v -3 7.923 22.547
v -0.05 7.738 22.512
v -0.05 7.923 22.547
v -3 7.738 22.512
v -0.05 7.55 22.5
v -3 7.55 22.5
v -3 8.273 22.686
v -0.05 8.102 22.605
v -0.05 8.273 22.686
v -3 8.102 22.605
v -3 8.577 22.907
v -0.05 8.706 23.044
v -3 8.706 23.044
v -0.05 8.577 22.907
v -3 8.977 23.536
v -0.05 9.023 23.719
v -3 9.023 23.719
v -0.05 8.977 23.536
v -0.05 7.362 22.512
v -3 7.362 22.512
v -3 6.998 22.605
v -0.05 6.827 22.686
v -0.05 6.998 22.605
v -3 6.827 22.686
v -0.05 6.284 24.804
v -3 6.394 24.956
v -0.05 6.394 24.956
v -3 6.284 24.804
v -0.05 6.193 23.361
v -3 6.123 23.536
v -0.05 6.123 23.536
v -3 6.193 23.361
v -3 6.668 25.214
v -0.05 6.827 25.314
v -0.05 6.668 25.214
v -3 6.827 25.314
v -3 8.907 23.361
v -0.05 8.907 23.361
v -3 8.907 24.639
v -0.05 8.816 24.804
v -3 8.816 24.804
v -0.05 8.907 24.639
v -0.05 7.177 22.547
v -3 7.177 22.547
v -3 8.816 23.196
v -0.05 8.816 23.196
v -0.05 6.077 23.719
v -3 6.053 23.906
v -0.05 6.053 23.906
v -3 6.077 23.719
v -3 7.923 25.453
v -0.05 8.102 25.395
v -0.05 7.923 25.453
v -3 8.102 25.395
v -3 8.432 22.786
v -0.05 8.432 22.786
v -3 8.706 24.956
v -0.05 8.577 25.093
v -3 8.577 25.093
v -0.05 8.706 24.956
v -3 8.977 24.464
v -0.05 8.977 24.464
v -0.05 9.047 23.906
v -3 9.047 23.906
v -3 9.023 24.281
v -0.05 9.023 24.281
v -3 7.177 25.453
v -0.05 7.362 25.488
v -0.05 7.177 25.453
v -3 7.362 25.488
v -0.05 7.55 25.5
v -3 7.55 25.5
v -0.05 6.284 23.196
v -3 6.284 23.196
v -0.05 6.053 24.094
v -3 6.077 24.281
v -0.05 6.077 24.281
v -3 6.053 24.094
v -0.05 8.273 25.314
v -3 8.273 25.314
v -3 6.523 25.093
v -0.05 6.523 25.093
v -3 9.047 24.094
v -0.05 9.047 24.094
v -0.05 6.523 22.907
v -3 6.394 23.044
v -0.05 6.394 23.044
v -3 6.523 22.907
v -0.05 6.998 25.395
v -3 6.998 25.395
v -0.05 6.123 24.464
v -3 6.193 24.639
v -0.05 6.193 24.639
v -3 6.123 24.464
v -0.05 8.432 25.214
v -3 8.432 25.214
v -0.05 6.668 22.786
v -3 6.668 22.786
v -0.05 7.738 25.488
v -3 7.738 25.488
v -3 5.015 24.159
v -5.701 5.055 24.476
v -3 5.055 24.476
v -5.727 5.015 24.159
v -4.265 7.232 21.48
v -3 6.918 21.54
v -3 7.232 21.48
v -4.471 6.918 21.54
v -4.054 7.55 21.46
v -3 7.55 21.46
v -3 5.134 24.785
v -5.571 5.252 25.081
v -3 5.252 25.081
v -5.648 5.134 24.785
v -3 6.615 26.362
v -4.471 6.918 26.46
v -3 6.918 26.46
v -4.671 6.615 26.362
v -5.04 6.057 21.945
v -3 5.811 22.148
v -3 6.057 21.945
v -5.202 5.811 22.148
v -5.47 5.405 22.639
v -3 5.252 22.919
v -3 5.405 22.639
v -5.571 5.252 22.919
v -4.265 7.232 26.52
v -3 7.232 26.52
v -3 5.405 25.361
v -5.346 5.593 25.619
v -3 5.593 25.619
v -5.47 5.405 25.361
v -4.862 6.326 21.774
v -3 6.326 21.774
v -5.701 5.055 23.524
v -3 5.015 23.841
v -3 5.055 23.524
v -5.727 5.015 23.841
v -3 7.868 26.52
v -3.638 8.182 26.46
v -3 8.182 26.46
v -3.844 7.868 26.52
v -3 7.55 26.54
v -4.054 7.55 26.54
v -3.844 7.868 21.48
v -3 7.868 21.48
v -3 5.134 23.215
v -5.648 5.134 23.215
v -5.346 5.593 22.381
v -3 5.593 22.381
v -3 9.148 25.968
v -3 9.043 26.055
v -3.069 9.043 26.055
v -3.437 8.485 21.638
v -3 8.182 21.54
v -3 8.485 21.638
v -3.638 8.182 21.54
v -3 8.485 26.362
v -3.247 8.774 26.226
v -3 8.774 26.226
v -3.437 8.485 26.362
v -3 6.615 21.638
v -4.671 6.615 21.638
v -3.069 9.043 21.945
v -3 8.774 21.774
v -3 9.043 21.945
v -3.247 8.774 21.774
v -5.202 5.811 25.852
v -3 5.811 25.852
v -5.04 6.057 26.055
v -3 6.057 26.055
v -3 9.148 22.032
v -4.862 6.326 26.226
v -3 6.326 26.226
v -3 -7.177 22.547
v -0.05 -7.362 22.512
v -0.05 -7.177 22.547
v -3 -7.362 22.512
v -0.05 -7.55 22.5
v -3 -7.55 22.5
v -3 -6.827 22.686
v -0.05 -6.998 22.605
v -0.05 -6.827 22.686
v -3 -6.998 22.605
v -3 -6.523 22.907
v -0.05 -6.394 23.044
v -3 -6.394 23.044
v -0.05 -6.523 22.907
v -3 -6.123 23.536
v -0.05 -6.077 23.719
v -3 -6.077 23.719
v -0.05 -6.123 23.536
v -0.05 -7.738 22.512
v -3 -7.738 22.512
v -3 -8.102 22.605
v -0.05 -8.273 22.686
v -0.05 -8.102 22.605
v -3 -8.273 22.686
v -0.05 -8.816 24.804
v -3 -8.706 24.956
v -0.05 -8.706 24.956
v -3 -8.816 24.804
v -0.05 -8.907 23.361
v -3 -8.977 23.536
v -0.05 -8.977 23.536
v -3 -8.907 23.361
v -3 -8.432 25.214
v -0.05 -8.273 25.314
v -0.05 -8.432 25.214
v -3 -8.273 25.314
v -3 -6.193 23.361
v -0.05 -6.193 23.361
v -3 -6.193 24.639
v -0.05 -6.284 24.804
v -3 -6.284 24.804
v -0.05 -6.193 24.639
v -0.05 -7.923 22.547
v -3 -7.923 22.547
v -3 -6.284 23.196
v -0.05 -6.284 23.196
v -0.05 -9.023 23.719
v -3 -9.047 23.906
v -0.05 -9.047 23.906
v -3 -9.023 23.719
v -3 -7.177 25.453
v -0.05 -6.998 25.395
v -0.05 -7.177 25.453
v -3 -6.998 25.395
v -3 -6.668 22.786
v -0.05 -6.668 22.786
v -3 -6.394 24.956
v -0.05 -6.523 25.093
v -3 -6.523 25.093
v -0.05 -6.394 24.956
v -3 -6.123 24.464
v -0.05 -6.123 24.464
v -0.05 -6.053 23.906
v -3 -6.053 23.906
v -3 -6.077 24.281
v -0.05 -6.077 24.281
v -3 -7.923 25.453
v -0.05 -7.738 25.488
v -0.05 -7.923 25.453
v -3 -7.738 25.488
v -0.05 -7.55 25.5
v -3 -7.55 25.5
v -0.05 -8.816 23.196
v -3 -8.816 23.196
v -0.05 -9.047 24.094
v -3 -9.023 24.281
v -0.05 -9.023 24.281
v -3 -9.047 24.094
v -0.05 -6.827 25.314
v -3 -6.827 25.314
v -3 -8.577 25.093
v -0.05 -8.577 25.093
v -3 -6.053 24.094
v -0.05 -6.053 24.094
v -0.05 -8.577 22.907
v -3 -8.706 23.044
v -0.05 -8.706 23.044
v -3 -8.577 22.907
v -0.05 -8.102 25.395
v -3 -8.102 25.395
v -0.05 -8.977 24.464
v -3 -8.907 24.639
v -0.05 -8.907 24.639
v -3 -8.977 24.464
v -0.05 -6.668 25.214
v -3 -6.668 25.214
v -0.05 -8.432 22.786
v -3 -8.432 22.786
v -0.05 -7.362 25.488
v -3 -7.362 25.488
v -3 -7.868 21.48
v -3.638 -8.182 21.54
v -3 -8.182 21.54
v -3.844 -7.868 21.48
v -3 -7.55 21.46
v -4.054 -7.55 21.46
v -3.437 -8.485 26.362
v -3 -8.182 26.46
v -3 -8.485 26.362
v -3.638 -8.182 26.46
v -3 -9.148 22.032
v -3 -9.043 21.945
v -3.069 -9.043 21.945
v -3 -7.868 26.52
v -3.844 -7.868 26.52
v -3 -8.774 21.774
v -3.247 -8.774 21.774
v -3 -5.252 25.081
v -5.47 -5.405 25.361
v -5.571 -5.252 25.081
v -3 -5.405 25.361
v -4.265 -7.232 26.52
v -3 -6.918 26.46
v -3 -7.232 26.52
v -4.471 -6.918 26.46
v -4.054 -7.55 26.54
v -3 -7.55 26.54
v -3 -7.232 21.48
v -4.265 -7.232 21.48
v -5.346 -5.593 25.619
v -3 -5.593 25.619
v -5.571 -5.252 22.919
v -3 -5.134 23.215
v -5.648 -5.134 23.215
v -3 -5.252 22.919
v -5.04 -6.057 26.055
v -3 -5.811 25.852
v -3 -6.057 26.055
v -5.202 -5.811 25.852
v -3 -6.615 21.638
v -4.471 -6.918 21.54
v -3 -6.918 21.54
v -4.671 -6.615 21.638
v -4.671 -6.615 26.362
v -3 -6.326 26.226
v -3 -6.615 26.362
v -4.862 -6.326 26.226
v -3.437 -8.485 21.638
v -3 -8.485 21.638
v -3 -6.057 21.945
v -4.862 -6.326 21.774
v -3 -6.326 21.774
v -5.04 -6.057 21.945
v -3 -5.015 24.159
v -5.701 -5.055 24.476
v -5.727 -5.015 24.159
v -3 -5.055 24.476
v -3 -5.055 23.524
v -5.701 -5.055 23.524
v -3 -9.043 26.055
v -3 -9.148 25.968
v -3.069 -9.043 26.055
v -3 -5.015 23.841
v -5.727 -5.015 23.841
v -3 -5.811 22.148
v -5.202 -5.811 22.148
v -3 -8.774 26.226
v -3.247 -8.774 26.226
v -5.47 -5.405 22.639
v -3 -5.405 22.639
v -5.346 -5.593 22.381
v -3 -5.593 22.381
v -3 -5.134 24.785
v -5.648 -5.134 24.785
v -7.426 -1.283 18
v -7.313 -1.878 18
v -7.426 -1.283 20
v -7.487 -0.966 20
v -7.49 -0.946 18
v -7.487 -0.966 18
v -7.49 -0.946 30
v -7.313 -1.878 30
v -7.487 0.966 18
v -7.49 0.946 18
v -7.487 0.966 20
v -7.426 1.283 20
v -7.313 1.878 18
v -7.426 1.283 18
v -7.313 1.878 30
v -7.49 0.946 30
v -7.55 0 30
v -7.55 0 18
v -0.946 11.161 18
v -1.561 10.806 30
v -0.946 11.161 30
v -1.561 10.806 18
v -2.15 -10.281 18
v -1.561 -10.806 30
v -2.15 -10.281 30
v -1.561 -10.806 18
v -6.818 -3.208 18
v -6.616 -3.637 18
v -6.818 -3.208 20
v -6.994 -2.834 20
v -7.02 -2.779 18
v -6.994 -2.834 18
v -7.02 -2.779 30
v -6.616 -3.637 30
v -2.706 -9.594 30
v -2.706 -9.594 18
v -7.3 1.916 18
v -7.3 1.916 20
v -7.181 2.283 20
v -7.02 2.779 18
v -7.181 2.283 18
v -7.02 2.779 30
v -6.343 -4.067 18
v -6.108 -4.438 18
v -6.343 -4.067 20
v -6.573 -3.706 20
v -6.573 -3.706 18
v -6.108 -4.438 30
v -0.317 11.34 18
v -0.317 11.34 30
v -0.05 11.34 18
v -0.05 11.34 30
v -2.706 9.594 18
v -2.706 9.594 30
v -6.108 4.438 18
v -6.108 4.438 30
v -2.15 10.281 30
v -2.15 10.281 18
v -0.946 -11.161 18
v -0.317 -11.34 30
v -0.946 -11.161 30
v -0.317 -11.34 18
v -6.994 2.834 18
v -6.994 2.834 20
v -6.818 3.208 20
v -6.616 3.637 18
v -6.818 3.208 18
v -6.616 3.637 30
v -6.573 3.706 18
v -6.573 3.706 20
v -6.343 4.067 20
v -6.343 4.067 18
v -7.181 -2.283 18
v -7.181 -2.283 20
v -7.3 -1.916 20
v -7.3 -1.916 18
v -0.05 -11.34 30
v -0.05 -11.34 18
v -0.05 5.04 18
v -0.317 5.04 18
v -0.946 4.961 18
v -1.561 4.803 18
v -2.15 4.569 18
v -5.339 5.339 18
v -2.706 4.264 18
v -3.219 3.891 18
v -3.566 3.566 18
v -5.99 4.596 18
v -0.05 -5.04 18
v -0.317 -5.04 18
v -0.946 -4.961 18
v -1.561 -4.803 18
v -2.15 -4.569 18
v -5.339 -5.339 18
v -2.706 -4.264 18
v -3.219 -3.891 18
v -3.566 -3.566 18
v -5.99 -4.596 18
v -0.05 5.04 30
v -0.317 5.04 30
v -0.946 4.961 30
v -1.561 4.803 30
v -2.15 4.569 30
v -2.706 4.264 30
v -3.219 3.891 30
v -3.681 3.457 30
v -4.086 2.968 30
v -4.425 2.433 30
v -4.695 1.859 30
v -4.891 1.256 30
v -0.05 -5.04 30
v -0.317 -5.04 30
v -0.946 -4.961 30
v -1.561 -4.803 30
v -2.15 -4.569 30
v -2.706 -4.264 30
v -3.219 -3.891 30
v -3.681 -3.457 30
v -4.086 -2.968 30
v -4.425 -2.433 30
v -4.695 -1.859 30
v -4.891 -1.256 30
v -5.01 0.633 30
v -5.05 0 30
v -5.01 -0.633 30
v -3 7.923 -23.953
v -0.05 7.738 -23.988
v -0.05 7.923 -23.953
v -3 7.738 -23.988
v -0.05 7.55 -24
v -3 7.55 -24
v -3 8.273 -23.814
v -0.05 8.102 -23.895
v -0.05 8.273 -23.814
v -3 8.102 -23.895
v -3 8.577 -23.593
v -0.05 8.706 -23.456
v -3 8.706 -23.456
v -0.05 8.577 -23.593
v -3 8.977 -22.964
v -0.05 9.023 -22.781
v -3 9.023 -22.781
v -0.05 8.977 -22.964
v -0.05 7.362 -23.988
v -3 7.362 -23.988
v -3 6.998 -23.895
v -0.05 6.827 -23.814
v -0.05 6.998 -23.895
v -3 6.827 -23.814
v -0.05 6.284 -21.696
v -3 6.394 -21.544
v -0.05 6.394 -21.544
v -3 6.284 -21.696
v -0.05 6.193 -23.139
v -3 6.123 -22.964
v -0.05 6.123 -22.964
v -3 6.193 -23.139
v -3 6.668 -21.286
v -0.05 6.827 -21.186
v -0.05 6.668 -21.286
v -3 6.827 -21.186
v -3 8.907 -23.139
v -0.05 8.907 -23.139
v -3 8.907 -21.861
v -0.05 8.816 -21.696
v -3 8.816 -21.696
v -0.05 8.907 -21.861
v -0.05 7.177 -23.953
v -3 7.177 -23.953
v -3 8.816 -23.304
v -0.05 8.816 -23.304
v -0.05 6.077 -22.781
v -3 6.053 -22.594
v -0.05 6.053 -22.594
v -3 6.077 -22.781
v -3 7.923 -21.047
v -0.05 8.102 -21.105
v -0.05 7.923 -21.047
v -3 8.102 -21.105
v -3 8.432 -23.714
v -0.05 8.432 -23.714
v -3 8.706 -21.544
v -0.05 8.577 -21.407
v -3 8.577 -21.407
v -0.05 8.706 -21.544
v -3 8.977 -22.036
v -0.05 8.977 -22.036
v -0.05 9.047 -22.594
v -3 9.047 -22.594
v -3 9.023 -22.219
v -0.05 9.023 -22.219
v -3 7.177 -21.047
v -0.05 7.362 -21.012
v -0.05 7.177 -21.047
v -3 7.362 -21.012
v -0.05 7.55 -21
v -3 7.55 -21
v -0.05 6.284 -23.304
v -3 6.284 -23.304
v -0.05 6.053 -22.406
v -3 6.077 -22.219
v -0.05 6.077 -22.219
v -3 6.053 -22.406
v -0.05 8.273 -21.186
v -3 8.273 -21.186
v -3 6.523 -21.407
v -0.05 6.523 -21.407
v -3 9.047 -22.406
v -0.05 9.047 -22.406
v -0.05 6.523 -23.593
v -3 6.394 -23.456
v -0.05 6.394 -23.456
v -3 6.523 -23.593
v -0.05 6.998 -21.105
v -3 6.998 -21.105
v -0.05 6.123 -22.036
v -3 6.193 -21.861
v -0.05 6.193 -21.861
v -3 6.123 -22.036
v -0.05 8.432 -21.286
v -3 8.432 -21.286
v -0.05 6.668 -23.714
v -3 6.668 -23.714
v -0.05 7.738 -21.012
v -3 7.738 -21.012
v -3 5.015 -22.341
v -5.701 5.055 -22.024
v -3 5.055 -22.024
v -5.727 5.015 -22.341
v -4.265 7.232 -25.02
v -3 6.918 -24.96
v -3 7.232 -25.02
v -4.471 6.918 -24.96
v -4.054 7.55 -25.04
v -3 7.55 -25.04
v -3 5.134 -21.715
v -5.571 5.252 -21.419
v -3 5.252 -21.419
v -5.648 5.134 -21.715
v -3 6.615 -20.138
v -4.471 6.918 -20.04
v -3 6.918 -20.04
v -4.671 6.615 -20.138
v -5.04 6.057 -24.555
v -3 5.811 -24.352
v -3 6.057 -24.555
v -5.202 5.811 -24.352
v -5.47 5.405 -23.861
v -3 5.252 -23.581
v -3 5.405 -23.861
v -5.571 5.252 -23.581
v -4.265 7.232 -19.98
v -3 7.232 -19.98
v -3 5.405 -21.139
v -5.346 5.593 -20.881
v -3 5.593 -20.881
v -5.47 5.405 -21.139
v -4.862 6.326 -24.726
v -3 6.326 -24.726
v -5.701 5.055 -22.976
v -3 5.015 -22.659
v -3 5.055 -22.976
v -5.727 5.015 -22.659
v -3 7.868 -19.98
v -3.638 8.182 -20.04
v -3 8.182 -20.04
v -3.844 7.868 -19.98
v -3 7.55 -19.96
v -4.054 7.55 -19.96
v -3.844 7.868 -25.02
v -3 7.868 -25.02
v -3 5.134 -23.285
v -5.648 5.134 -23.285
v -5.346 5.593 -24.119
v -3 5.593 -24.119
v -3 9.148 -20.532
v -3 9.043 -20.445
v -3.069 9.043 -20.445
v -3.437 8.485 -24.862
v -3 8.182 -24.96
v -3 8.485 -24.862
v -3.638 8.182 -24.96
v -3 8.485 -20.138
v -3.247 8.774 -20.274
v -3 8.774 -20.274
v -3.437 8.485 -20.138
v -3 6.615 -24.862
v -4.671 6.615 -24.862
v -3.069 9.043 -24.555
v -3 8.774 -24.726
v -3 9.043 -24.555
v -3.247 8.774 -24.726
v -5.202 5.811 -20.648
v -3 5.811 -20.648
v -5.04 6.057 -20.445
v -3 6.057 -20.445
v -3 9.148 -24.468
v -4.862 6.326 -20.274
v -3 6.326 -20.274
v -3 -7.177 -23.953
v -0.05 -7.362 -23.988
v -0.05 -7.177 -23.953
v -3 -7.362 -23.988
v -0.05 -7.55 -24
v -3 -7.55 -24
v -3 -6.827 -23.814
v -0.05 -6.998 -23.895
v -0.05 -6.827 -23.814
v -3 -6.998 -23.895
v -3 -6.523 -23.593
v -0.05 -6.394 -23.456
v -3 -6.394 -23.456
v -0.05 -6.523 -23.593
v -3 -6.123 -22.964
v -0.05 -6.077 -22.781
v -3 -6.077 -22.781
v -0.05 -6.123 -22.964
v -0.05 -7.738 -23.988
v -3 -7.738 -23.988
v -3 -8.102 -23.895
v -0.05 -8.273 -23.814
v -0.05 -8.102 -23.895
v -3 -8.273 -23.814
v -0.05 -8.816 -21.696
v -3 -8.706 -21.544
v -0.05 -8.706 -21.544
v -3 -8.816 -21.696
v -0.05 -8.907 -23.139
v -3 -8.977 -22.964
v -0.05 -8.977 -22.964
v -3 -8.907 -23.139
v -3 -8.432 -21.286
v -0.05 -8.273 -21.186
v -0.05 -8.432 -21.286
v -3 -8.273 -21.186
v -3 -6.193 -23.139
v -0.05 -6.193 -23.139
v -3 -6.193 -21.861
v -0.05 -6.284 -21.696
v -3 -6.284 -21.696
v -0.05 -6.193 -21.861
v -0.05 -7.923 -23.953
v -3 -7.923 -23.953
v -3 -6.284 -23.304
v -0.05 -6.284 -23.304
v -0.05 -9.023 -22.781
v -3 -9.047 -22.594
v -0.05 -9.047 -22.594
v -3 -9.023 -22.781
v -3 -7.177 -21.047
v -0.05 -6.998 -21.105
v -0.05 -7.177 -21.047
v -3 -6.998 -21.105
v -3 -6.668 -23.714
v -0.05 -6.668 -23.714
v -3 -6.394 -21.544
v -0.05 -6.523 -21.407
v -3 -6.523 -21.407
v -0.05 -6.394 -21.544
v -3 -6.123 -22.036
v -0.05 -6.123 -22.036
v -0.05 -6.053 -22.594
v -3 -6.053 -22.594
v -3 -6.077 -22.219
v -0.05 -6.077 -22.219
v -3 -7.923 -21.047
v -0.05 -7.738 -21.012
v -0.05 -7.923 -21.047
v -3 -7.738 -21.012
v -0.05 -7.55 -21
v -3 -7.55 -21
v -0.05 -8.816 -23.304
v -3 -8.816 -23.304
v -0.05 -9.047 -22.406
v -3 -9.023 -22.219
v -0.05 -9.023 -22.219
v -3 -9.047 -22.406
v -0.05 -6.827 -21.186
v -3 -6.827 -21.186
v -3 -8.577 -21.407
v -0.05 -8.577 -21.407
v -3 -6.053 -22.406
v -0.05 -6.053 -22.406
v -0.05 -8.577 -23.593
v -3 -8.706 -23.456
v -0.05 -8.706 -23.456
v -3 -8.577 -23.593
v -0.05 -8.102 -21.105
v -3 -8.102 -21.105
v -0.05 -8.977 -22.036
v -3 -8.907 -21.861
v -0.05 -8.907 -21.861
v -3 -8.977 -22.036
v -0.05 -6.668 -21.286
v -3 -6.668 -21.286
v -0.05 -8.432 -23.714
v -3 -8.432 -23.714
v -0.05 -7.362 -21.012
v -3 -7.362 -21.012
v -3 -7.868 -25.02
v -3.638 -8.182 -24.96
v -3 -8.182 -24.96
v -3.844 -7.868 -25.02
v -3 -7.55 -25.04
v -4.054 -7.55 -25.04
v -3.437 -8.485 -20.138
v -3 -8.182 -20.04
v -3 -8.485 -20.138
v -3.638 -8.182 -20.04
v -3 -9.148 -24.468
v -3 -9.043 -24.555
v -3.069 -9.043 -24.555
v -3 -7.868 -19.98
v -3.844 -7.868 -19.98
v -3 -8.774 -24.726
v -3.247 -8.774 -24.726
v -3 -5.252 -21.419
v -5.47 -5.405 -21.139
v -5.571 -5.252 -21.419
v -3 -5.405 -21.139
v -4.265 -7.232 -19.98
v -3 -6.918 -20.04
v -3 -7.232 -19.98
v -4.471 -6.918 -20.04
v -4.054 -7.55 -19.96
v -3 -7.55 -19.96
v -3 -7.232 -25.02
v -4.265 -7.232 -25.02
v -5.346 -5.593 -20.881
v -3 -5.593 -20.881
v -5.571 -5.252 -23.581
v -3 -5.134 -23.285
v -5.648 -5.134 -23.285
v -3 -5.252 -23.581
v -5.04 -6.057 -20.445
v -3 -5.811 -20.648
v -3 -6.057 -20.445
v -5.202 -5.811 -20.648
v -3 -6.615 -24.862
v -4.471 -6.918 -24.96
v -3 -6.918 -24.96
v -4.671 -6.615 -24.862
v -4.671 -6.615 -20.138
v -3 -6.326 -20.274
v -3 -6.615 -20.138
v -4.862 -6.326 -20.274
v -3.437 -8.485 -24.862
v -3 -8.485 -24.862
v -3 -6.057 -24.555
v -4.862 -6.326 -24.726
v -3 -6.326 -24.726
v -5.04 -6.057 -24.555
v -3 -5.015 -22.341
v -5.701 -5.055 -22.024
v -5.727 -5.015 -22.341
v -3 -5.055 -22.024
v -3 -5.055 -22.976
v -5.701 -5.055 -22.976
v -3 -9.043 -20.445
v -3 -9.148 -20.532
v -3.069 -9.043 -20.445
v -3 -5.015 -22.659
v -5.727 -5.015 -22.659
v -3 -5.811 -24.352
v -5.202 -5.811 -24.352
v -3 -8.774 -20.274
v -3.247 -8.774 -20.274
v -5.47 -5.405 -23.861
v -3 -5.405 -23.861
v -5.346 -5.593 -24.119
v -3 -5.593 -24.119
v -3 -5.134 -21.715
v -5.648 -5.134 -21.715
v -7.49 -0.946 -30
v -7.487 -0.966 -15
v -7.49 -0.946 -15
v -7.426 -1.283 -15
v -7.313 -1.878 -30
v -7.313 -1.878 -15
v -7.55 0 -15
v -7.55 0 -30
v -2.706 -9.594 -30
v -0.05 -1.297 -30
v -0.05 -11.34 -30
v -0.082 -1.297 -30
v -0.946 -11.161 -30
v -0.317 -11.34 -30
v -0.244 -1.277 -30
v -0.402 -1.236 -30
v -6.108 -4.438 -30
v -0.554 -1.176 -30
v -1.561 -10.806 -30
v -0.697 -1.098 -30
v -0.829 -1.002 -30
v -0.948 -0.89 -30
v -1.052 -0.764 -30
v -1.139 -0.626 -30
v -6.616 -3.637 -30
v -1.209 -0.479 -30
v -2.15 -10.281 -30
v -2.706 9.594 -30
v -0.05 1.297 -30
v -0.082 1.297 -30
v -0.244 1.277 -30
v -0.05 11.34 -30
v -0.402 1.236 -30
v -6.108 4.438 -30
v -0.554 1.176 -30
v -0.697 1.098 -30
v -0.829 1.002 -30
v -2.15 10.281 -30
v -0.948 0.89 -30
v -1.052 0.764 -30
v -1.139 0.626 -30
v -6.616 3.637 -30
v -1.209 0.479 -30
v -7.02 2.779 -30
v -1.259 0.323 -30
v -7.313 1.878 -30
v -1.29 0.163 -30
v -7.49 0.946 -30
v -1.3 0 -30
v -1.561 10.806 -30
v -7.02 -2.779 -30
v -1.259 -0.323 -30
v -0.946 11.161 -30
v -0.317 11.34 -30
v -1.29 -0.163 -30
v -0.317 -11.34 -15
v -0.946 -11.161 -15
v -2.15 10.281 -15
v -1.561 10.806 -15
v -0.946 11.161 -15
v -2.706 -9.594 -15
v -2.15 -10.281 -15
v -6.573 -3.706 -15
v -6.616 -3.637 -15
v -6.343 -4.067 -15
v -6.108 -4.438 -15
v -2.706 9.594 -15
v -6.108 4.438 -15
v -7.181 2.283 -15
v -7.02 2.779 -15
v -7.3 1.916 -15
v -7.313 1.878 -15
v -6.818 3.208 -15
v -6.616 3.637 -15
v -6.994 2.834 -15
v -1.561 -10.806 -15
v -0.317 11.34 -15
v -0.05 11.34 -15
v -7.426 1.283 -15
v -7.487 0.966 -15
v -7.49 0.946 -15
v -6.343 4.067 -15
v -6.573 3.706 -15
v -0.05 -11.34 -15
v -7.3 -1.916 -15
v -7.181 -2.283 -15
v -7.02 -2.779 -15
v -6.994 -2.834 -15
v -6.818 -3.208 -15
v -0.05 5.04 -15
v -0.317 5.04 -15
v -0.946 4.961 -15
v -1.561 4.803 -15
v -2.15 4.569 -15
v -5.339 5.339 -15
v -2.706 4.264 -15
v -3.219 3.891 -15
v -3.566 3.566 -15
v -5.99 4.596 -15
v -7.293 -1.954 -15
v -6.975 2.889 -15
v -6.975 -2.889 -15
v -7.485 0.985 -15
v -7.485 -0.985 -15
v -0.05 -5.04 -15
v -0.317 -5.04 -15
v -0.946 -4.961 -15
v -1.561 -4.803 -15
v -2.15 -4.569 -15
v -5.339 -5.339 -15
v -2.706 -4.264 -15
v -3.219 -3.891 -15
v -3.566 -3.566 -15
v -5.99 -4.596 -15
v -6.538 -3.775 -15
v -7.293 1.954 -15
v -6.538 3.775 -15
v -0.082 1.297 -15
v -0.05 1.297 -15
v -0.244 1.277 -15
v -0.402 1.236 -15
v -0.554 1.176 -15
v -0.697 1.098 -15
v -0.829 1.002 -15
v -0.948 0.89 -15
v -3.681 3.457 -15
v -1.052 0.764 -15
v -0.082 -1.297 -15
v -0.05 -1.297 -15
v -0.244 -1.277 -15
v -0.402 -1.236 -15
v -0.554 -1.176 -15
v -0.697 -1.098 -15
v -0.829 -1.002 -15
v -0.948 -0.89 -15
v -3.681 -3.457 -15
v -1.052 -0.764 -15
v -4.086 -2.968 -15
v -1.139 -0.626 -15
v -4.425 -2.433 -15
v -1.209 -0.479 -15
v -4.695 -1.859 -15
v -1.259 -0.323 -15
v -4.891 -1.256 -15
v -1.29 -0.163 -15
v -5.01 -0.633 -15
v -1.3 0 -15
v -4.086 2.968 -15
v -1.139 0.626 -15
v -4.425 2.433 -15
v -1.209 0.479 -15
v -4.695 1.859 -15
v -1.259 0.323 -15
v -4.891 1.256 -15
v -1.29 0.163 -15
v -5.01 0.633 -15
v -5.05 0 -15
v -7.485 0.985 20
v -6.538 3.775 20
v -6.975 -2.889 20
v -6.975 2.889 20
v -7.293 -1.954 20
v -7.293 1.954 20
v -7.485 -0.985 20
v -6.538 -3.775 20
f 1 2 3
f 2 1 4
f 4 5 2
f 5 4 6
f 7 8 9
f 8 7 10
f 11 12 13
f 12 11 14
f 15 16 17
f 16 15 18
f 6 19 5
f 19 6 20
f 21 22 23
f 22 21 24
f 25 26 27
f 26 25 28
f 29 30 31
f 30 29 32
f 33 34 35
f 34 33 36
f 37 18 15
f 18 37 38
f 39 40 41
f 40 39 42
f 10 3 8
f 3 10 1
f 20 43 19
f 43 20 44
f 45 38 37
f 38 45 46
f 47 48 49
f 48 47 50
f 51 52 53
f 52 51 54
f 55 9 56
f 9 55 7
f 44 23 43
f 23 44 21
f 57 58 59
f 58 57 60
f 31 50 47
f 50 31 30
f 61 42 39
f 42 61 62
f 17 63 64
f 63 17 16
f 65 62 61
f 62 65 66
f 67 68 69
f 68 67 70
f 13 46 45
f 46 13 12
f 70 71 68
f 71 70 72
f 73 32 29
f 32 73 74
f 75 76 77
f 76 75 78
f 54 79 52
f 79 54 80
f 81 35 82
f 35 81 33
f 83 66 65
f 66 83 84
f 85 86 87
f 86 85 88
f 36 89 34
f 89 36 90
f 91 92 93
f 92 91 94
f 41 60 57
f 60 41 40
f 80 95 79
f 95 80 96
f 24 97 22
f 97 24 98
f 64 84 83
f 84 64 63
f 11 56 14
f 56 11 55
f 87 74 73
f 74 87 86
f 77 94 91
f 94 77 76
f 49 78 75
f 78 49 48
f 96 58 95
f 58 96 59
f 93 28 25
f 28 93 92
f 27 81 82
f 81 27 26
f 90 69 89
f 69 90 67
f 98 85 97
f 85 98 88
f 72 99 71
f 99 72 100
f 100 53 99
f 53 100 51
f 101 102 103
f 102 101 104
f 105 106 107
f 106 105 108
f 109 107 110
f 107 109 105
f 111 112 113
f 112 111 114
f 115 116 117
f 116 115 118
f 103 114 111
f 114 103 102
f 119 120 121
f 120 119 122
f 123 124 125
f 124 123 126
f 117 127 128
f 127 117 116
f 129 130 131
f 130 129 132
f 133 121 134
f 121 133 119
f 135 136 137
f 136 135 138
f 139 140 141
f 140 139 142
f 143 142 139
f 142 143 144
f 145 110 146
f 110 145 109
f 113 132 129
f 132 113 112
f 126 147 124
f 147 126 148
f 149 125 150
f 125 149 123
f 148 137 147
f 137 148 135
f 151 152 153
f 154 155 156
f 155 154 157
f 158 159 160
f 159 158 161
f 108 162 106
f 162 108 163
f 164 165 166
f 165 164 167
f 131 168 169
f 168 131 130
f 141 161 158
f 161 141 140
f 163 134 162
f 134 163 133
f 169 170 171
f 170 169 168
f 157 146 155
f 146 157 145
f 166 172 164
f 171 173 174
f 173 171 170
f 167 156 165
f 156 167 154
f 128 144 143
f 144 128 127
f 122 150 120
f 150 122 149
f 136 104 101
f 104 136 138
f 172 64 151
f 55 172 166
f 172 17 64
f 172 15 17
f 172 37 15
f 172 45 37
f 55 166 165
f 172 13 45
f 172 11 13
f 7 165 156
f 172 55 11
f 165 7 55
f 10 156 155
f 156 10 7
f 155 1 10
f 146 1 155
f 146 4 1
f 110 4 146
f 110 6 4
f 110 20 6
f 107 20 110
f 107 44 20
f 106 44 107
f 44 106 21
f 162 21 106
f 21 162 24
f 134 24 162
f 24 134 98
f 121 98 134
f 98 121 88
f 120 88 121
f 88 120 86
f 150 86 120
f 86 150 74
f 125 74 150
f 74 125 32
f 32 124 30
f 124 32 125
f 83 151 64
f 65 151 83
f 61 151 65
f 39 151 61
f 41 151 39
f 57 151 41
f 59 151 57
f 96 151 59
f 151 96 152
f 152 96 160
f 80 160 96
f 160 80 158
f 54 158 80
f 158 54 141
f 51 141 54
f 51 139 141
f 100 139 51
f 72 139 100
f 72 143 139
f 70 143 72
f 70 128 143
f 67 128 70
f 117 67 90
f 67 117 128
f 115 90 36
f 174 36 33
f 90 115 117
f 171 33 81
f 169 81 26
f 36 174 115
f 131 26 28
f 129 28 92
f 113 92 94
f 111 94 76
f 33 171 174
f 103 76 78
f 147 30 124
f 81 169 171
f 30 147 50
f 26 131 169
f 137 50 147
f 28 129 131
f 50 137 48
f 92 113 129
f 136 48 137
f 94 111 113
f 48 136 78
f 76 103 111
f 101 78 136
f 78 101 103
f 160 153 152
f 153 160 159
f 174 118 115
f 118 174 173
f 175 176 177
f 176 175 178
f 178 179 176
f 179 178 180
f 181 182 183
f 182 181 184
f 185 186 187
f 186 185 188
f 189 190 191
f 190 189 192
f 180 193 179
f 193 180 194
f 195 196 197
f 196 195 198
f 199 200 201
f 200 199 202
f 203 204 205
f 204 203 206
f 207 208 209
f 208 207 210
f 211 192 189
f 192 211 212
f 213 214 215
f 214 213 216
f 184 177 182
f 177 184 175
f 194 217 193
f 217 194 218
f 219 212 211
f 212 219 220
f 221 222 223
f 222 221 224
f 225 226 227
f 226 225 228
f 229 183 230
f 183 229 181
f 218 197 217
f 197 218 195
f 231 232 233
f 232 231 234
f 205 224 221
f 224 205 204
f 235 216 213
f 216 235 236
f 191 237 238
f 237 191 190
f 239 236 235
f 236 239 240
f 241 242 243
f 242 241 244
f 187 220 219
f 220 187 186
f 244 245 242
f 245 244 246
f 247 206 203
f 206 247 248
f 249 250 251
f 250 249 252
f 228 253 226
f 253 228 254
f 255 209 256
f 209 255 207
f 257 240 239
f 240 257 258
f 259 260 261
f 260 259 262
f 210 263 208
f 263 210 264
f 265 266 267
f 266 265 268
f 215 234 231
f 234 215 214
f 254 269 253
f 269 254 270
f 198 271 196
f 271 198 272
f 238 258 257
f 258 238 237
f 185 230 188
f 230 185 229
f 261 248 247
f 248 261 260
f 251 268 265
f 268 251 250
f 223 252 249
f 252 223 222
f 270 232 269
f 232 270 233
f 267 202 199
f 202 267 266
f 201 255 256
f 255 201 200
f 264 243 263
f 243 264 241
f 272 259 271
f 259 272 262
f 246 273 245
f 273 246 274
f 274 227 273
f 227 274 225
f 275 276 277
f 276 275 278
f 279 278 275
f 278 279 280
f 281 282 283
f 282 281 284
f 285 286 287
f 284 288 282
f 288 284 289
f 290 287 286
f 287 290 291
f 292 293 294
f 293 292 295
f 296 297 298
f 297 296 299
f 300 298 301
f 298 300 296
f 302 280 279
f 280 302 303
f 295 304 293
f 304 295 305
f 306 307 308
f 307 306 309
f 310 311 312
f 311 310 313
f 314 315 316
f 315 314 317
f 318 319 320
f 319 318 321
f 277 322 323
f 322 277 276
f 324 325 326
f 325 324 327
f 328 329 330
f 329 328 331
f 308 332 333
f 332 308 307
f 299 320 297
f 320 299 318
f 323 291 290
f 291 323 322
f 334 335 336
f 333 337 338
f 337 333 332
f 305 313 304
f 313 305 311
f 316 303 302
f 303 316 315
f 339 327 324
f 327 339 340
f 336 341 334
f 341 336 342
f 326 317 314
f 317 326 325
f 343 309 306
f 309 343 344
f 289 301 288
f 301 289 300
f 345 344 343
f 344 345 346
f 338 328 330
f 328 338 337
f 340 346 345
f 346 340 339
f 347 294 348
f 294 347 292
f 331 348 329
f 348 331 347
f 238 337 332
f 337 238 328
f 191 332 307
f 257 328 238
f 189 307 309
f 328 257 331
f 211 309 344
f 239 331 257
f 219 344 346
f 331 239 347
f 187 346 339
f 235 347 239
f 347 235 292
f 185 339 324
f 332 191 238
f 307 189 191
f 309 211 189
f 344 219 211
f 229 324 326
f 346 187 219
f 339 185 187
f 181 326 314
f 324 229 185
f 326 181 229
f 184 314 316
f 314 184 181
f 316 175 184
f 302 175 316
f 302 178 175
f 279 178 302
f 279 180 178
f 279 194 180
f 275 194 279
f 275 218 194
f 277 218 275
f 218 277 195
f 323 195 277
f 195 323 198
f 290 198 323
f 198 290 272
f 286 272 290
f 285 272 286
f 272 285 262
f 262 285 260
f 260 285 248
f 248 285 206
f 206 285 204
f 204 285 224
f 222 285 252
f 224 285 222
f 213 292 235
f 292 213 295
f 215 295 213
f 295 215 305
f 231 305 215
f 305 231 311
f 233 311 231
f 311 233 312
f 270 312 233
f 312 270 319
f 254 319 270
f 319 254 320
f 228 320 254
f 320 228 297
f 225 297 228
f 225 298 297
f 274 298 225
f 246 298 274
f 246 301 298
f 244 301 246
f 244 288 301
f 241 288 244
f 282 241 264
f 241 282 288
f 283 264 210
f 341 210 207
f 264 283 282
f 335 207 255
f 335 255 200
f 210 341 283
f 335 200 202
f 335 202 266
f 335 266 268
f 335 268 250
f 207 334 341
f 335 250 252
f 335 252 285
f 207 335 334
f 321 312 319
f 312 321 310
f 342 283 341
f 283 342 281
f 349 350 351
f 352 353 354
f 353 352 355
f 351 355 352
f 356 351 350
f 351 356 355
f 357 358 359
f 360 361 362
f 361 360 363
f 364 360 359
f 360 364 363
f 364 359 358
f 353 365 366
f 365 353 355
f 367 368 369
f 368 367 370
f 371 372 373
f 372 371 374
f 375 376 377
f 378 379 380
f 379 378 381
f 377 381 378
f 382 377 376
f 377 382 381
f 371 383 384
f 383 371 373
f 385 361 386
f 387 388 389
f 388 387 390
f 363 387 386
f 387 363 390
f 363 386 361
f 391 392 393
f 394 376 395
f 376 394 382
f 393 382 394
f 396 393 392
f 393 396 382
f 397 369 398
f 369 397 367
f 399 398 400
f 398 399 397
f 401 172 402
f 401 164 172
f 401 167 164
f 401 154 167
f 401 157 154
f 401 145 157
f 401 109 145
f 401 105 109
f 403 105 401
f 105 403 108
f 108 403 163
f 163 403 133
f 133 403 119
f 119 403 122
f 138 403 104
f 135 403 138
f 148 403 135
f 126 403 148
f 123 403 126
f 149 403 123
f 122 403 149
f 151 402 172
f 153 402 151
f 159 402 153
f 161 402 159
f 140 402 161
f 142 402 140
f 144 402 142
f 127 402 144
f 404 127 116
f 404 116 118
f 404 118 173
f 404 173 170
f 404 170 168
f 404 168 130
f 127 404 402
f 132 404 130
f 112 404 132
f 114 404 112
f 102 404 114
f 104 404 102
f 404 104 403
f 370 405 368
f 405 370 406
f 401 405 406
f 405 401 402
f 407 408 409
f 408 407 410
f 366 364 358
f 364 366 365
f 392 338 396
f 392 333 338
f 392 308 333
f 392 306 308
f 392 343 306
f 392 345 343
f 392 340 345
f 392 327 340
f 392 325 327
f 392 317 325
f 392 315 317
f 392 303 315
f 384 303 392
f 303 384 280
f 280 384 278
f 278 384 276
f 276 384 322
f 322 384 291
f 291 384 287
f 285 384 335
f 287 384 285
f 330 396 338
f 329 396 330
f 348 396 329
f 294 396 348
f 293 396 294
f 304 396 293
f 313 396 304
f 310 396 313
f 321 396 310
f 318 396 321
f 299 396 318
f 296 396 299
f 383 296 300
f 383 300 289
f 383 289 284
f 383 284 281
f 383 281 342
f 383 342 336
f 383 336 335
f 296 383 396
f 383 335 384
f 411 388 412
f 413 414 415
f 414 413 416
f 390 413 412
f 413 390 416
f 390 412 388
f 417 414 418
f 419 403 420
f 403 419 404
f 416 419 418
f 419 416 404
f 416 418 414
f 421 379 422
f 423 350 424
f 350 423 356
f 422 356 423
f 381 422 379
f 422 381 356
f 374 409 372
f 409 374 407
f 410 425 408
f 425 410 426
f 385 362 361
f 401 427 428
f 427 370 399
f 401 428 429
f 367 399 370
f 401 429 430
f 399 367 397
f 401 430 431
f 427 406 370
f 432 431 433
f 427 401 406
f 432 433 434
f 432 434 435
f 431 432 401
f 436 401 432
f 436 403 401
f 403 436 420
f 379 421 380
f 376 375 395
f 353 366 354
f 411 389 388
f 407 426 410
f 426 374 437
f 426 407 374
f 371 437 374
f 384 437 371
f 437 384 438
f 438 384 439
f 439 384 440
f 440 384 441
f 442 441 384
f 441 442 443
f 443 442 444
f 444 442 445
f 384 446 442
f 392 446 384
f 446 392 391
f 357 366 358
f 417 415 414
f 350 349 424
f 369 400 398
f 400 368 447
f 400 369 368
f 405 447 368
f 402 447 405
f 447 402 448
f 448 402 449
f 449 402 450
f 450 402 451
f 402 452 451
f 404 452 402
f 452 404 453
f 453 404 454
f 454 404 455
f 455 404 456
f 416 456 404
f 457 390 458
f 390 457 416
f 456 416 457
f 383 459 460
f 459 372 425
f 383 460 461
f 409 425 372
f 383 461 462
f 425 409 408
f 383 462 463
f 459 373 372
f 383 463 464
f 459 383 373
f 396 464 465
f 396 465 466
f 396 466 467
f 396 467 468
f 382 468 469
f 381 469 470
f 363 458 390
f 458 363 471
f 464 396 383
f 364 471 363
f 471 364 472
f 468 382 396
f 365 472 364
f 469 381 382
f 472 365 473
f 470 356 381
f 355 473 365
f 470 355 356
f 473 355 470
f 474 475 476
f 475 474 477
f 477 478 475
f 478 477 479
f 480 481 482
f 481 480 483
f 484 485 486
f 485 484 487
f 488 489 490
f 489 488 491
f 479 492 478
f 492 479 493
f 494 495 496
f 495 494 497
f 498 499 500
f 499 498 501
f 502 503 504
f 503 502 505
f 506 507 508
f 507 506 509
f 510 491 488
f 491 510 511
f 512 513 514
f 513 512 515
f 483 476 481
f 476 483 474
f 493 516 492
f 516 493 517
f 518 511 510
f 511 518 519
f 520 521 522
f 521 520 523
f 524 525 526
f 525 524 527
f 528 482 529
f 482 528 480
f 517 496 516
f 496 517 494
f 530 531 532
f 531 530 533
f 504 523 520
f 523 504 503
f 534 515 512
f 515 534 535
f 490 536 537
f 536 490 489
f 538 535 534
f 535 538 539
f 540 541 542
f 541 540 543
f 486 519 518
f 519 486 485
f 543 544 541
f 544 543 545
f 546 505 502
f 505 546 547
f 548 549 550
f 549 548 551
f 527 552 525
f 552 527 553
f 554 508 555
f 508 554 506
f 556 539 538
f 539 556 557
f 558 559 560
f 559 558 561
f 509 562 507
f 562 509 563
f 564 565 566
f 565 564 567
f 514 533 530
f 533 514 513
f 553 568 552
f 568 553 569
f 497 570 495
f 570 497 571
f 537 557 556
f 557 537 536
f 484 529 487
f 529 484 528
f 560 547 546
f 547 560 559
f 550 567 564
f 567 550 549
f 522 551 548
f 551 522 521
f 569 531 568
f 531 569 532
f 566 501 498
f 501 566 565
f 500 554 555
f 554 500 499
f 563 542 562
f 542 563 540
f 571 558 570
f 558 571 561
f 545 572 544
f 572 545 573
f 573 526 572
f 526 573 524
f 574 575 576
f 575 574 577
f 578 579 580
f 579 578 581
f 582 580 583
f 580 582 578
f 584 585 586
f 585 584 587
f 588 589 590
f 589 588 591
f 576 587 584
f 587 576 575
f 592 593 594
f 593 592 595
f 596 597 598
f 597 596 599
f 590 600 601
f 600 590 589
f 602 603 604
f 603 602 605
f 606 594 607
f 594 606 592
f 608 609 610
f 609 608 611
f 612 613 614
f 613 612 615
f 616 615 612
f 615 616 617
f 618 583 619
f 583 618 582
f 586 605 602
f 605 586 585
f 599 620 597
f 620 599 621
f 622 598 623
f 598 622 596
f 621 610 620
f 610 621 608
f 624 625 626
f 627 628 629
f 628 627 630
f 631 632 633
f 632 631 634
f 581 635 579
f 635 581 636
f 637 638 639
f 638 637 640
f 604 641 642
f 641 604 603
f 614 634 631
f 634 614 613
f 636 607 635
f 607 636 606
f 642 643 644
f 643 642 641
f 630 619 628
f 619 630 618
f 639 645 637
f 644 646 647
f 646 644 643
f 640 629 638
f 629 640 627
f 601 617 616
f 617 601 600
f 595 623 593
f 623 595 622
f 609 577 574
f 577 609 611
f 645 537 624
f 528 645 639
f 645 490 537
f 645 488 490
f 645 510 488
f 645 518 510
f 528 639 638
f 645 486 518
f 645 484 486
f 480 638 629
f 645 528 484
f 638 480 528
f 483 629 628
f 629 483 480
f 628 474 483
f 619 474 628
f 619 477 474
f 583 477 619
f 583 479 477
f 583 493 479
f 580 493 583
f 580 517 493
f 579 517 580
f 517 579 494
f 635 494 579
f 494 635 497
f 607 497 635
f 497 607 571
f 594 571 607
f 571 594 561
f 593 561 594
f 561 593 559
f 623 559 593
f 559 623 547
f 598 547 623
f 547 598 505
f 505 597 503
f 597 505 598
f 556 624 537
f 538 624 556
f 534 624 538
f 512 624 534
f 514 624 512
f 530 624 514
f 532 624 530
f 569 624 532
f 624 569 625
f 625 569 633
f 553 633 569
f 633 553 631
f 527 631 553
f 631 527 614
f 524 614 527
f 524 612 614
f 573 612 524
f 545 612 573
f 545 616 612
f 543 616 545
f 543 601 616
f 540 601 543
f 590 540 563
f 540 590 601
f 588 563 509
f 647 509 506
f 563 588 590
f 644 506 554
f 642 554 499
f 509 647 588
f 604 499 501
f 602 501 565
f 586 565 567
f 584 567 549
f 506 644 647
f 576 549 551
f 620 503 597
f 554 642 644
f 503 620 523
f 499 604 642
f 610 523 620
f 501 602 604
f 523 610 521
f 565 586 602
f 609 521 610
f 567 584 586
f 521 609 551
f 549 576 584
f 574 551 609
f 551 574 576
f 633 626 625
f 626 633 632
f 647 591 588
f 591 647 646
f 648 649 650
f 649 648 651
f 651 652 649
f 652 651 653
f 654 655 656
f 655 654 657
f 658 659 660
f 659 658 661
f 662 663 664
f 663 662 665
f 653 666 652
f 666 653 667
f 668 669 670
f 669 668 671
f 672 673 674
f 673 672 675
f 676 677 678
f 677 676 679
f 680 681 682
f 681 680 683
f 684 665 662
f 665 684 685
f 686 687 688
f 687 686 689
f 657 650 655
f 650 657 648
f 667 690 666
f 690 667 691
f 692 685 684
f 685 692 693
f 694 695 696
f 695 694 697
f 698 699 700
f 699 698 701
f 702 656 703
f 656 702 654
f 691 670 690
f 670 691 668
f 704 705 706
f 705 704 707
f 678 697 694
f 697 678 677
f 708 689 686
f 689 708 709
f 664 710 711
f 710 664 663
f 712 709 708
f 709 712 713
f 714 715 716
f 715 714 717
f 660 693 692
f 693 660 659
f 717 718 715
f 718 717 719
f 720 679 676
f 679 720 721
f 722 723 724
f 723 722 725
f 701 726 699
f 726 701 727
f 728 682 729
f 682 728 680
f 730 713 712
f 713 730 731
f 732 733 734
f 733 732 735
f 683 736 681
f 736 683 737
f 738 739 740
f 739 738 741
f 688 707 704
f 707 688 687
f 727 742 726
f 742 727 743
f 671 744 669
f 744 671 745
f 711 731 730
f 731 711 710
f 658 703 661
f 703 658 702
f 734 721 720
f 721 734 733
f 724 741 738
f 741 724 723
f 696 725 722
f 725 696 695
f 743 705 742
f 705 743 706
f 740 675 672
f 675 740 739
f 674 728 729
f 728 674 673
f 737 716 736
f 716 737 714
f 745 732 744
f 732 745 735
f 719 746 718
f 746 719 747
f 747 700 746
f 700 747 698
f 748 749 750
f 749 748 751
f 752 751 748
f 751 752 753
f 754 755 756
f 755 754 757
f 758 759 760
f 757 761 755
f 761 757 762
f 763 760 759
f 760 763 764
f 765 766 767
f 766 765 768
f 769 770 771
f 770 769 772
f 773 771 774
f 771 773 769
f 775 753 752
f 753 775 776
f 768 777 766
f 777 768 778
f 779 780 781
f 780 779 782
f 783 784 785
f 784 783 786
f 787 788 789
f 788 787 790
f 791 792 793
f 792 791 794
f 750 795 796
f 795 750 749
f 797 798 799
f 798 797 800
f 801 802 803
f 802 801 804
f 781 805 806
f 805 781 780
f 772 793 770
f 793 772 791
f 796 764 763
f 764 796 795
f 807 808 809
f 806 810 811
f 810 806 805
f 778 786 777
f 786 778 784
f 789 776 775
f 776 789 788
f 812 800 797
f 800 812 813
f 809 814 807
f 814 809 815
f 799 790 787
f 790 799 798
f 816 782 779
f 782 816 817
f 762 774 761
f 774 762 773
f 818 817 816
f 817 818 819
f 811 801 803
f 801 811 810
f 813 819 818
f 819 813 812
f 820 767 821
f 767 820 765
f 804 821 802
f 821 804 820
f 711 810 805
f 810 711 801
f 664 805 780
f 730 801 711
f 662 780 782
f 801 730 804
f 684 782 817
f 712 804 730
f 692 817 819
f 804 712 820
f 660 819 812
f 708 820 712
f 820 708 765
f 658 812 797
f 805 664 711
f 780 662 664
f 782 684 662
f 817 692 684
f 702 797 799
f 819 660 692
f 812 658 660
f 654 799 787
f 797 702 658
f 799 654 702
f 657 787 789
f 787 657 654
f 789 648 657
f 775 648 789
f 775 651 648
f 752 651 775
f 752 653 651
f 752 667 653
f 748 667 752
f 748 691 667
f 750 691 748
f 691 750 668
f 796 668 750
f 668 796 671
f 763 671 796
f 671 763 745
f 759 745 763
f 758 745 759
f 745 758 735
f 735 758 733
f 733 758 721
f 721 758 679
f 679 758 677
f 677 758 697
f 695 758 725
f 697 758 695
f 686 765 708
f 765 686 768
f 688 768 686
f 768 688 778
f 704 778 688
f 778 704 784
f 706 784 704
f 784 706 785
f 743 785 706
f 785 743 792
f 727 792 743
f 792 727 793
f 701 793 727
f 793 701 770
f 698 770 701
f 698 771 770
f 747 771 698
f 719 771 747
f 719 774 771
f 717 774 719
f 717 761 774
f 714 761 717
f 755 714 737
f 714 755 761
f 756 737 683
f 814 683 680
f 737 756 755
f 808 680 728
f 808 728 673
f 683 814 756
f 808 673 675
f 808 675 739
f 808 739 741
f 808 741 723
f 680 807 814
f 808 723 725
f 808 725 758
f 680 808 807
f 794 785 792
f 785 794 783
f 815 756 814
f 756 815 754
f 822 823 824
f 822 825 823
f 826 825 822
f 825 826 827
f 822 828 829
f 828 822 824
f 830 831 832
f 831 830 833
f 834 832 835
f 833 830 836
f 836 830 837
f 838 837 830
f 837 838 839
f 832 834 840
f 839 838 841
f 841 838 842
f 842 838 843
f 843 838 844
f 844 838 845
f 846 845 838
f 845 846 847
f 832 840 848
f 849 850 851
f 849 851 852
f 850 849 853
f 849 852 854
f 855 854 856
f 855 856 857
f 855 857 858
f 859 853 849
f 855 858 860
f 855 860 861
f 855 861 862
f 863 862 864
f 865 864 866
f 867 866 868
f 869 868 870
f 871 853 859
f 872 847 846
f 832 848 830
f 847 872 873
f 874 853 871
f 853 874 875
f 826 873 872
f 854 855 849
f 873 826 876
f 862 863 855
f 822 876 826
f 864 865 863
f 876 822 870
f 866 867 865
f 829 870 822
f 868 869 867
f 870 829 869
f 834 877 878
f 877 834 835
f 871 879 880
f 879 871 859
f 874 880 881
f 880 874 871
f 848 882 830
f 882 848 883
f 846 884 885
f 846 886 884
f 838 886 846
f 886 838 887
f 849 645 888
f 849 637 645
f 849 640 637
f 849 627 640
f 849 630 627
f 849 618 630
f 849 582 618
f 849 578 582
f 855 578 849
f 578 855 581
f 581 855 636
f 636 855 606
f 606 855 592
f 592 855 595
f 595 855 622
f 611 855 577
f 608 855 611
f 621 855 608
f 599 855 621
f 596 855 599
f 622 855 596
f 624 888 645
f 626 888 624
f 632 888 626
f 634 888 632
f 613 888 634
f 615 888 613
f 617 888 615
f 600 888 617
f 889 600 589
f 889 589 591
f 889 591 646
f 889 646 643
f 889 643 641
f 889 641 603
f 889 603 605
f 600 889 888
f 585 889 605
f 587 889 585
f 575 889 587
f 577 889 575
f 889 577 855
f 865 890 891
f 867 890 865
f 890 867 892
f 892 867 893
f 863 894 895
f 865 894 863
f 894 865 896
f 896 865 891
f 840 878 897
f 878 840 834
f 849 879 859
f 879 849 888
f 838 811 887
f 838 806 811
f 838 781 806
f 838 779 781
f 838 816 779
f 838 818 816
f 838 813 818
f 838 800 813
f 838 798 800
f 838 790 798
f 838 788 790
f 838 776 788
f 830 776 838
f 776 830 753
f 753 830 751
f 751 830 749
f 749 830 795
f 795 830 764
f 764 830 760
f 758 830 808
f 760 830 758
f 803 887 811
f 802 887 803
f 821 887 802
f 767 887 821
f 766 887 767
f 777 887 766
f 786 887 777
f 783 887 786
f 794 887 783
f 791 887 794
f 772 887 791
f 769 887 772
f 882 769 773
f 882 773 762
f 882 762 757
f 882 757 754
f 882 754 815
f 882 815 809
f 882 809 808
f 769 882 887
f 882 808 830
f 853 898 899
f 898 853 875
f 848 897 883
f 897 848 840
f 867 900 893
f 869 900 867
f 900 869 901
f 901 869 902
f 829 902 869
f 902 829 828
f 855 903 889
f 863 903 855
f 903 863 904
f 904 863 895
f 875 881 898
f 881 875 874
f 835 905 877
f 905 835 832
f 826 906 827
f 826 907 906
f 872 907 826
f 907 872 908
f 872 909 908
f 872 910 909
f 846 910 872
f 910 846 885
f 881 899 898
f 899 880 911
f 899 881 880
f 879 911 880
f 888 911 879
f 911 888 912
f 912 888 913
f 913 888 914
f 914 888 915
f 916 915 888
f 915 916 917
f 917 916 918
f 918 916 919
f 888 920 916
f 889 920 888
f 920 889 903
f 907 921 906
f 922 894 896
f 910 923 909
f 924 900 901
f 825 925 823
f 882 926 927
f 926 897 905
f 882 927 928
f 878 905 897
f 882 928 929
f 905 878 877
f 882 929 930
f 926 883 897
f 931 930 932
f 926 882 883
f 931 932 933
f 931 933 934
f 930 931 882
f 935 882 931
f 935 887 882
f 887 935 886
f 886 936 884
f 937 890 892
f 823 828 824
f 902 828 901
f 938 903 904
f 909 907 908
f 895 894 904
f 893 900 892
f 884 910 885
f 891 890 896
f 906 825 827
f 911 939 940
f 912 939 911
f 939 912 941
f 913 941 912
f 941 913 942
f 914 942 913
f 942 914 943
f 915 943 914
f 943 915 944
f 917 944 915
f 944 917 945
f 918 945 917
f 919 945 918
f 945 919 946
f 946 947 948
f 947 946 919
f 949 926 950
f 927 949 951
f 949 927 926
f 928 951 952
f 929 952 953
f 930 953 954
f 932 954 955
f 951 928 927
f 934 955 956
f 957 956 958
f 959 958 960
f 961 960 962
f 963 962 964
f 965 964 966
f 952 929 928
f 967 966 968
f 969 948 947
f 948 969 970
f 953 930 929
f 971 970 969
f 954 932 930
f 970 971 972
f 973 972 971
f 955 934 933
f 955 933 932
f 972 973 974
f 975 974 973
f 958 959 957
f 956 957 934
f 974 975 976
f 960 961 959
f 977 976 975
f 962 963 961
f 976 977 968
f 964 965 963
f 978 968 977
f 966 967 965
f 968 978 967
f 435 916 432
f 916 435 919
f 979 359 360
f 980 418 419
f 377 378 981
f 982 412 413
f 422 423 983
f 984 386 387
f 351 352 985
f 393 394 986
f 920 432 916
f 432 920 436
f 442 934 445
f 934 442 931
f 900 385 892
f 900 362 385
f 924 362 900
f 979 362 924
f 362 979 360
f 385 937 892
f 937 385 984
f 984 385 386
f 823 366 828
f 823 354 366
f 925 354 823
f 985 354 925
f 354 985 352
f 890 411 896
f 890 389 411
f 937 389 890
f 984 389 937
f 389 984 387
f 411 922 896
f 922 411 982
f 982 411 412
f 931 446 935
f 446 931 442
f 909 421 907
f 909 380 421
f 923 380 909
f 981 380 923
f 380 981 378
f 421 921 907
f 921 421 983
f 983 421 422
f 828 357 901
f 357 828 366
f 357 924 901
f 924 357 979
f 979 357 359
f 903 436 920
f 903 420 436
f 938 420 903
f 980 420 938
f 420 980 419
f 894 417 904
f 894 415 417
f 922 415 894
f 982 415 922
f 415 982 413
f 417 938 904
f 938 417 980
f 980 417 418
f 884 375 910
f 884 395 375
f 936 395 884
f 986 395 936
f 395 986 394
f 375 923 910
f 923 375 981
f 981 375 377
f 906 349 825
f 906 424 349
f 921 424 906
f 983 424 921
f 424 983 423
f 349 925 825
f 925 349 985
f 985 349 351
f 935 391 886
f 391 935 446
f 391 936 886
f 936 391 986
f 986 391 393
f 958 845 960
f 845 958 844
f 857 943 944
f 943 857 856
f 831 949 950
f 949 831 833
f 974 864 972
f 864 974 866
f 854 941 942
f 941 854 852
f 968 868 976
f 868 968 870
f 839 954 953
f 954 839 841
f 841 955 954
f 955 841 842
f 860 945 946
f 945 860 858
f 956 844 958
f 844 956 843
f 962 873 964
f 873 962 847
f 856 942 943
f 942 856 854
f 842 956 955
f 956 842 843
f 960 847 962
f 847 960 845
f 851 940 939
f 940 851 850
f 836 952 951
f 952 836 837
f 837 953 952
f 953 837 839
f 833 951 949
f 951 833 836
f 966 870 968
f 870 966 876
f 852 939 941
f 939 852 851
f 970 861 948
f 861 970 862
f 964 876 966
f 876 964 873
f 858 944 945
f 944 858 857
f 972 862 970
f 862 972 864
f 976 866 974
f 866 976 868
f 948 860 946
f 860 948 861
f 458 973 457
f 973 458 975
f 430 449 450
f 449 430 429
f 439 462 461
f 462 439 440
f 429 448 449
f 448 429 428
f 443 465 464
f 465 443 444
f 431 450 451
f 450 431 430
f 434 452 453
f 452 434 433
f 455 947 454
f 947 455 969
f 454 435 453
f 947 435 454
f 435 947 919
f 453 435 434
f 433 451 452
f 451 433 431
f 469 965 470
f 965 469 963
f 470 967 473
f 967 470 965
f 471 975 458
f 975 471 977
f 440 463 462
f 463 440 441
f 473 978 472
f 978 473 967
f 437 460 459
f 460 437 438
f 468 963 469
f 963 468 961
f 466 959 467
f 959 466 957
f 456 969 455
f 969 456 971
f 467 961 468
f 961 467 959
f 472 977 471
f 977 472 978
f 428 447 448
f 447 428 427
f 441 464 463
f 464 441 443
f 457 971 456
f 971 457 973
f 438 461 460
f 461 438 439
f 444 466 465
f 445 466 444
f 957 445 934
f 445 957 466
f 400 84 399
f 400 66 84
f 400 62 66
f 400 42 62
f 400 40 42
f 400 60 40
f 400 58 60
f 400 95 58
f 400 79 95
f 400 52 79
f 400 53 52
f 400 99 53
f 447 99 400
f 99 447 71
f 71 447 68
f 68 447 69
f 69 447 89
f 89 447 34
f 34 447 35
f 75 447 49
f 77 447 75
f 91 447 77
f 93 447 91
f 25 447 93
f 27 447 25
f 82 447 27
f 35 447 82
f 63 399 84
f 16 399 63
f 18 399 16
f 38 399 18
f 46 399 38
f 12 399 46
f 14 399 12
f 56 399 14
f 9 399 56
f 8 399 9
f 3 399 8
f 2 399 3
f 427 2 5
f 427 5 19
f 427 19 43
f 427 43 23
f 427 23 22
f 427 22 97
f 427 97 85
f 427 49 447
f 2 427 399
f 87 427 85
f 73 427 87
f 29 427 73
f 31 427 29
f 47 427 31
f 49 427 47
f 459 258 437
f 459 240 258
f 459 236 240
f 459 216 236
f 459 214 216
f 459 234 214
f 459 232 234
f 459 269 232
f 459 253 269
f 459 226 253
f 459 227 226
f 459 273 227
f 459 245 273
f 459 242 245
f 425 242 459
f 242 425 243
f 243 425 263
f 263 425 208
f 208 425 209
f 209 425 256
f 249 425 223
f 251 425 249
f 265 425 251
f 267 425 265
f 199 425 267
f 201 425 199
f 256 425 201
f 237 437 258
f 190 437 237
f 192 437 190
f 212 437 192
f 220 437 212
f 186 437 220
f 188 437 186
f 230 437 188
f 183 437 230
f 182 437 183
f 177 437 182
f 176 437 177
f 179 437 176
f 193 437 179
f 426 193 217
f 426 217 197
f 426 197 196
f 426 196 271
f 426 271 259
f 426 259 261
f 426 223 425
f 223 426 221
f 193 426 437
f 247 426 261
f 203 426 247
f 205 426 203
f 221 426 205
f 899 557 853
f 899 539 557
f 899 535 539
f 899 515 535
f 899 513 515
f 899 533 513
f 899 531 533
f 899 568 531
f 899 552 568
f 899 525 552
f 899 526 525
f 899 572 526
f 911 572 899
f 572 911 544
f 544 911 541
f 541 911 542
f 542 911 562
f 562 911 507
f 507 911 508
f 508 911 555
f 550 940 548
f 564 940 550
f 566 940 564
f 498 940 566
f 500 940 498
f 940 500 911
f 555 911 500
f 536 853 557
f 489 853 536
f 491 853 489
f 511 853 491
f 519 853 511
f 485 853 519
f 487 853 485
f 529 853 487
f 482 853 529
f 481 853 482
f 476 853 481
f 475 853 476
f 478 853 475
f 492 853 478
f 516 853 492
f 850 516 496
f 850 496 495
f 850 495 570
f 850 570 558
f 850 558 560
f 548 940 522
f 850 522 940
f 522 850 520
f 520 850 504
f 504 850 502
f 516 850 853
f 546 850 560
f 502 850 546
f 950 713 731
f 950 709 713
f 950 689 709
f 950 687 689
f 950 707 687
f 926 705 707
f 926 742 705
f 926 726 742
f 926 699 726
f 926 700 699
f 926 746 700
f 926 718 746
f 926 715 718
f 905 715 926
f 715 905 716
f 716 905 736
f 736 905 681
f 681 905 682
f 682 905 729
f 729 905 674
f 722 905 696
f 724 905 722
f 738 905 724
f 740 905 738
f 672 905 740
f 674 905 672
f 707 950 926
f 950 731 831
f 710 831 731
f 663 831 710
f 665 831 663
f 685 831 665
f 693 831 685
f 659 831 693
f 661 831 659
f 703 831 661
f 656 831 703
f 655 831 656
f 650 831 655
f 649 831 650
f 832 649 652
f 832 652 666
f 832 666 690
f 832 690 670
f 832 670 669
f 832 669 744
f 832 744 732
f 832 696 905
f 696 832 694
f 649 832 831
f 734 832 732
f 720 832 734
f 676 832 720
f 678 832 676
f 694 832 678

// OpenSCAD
// clamped "cradle" for restraining stepper wires in our disected
// newport ppd225 linear actuator

$fn=50;
inch = 25.4;

// params
length = 60;
d_stepper = 10.1;
thickness = 2.5;
d_wire = 1.3;

sp = [0, d_stepper/2+thickness, length/2-5];

module screwhole(){
    union(){
        cylinder(20, r=1.5, center=true);  // fits 4-40
        translate([0,0, 3])
        cylinder(20, r=0.2*inch/2);
        translate([0,0,-3]) rotate([180,0,0])
        cylinder(20, r=0.2*inch/2);
    }
}

module clamp_cylinder(height, scale){
    difference(){
        linear_extrude(height=height)
        hull(){
            circle(r=d_stepper/2 + thickness);
            scale([1,scale]) circle(r=d_stepper/2);
        }
        for (pm=[1,-1]){
            translate([0, (d_stepper/2+thickness)*pm, height/2])
            rotate([0,90,0])
            screwhole();
        }
    }
}

module structure_cylinder(){
    translate([0,0,-15])
    rotate([0, 0, 135])
    rotate_extrude(angle=90)
    square([d_stepper/2 + thickness, 35]);
    //cylinder(h=length, r=d_stepper/2 + thickness, center=true);
}


difference(){
    union(){
        translate([0,0,length/2-12])
        clamp_cylinder(12, 2.25);
        translate([0,0,-length/2])
        //rotate([0,0,90])
        // rotate_extrude(angle=180)
        // square([d_stepper/2+thickness,15]);
        clamp_cylinder(15, 2.25);
        structure_cylinder();
    }
    // wire through hole
    //cube([2*d_wire, 2*d_wire, length+1], center=true);
    cylinder(h=length+1, r=d_wire, center=true);
    // for (dx=[1,2,3,4]){
    //     translate([-2, d_stepper*(0.5-dx/5),0])
    //     rotate([0,180,0])
    //     cylinder(length+1, r=d_wire/2, center=true);
    // }
    translate([0,0,-15]) cylinder(51, r=d_stepper/2);
    translate([length,0,0]) cube(2*length + 0.1, center=true);
}
